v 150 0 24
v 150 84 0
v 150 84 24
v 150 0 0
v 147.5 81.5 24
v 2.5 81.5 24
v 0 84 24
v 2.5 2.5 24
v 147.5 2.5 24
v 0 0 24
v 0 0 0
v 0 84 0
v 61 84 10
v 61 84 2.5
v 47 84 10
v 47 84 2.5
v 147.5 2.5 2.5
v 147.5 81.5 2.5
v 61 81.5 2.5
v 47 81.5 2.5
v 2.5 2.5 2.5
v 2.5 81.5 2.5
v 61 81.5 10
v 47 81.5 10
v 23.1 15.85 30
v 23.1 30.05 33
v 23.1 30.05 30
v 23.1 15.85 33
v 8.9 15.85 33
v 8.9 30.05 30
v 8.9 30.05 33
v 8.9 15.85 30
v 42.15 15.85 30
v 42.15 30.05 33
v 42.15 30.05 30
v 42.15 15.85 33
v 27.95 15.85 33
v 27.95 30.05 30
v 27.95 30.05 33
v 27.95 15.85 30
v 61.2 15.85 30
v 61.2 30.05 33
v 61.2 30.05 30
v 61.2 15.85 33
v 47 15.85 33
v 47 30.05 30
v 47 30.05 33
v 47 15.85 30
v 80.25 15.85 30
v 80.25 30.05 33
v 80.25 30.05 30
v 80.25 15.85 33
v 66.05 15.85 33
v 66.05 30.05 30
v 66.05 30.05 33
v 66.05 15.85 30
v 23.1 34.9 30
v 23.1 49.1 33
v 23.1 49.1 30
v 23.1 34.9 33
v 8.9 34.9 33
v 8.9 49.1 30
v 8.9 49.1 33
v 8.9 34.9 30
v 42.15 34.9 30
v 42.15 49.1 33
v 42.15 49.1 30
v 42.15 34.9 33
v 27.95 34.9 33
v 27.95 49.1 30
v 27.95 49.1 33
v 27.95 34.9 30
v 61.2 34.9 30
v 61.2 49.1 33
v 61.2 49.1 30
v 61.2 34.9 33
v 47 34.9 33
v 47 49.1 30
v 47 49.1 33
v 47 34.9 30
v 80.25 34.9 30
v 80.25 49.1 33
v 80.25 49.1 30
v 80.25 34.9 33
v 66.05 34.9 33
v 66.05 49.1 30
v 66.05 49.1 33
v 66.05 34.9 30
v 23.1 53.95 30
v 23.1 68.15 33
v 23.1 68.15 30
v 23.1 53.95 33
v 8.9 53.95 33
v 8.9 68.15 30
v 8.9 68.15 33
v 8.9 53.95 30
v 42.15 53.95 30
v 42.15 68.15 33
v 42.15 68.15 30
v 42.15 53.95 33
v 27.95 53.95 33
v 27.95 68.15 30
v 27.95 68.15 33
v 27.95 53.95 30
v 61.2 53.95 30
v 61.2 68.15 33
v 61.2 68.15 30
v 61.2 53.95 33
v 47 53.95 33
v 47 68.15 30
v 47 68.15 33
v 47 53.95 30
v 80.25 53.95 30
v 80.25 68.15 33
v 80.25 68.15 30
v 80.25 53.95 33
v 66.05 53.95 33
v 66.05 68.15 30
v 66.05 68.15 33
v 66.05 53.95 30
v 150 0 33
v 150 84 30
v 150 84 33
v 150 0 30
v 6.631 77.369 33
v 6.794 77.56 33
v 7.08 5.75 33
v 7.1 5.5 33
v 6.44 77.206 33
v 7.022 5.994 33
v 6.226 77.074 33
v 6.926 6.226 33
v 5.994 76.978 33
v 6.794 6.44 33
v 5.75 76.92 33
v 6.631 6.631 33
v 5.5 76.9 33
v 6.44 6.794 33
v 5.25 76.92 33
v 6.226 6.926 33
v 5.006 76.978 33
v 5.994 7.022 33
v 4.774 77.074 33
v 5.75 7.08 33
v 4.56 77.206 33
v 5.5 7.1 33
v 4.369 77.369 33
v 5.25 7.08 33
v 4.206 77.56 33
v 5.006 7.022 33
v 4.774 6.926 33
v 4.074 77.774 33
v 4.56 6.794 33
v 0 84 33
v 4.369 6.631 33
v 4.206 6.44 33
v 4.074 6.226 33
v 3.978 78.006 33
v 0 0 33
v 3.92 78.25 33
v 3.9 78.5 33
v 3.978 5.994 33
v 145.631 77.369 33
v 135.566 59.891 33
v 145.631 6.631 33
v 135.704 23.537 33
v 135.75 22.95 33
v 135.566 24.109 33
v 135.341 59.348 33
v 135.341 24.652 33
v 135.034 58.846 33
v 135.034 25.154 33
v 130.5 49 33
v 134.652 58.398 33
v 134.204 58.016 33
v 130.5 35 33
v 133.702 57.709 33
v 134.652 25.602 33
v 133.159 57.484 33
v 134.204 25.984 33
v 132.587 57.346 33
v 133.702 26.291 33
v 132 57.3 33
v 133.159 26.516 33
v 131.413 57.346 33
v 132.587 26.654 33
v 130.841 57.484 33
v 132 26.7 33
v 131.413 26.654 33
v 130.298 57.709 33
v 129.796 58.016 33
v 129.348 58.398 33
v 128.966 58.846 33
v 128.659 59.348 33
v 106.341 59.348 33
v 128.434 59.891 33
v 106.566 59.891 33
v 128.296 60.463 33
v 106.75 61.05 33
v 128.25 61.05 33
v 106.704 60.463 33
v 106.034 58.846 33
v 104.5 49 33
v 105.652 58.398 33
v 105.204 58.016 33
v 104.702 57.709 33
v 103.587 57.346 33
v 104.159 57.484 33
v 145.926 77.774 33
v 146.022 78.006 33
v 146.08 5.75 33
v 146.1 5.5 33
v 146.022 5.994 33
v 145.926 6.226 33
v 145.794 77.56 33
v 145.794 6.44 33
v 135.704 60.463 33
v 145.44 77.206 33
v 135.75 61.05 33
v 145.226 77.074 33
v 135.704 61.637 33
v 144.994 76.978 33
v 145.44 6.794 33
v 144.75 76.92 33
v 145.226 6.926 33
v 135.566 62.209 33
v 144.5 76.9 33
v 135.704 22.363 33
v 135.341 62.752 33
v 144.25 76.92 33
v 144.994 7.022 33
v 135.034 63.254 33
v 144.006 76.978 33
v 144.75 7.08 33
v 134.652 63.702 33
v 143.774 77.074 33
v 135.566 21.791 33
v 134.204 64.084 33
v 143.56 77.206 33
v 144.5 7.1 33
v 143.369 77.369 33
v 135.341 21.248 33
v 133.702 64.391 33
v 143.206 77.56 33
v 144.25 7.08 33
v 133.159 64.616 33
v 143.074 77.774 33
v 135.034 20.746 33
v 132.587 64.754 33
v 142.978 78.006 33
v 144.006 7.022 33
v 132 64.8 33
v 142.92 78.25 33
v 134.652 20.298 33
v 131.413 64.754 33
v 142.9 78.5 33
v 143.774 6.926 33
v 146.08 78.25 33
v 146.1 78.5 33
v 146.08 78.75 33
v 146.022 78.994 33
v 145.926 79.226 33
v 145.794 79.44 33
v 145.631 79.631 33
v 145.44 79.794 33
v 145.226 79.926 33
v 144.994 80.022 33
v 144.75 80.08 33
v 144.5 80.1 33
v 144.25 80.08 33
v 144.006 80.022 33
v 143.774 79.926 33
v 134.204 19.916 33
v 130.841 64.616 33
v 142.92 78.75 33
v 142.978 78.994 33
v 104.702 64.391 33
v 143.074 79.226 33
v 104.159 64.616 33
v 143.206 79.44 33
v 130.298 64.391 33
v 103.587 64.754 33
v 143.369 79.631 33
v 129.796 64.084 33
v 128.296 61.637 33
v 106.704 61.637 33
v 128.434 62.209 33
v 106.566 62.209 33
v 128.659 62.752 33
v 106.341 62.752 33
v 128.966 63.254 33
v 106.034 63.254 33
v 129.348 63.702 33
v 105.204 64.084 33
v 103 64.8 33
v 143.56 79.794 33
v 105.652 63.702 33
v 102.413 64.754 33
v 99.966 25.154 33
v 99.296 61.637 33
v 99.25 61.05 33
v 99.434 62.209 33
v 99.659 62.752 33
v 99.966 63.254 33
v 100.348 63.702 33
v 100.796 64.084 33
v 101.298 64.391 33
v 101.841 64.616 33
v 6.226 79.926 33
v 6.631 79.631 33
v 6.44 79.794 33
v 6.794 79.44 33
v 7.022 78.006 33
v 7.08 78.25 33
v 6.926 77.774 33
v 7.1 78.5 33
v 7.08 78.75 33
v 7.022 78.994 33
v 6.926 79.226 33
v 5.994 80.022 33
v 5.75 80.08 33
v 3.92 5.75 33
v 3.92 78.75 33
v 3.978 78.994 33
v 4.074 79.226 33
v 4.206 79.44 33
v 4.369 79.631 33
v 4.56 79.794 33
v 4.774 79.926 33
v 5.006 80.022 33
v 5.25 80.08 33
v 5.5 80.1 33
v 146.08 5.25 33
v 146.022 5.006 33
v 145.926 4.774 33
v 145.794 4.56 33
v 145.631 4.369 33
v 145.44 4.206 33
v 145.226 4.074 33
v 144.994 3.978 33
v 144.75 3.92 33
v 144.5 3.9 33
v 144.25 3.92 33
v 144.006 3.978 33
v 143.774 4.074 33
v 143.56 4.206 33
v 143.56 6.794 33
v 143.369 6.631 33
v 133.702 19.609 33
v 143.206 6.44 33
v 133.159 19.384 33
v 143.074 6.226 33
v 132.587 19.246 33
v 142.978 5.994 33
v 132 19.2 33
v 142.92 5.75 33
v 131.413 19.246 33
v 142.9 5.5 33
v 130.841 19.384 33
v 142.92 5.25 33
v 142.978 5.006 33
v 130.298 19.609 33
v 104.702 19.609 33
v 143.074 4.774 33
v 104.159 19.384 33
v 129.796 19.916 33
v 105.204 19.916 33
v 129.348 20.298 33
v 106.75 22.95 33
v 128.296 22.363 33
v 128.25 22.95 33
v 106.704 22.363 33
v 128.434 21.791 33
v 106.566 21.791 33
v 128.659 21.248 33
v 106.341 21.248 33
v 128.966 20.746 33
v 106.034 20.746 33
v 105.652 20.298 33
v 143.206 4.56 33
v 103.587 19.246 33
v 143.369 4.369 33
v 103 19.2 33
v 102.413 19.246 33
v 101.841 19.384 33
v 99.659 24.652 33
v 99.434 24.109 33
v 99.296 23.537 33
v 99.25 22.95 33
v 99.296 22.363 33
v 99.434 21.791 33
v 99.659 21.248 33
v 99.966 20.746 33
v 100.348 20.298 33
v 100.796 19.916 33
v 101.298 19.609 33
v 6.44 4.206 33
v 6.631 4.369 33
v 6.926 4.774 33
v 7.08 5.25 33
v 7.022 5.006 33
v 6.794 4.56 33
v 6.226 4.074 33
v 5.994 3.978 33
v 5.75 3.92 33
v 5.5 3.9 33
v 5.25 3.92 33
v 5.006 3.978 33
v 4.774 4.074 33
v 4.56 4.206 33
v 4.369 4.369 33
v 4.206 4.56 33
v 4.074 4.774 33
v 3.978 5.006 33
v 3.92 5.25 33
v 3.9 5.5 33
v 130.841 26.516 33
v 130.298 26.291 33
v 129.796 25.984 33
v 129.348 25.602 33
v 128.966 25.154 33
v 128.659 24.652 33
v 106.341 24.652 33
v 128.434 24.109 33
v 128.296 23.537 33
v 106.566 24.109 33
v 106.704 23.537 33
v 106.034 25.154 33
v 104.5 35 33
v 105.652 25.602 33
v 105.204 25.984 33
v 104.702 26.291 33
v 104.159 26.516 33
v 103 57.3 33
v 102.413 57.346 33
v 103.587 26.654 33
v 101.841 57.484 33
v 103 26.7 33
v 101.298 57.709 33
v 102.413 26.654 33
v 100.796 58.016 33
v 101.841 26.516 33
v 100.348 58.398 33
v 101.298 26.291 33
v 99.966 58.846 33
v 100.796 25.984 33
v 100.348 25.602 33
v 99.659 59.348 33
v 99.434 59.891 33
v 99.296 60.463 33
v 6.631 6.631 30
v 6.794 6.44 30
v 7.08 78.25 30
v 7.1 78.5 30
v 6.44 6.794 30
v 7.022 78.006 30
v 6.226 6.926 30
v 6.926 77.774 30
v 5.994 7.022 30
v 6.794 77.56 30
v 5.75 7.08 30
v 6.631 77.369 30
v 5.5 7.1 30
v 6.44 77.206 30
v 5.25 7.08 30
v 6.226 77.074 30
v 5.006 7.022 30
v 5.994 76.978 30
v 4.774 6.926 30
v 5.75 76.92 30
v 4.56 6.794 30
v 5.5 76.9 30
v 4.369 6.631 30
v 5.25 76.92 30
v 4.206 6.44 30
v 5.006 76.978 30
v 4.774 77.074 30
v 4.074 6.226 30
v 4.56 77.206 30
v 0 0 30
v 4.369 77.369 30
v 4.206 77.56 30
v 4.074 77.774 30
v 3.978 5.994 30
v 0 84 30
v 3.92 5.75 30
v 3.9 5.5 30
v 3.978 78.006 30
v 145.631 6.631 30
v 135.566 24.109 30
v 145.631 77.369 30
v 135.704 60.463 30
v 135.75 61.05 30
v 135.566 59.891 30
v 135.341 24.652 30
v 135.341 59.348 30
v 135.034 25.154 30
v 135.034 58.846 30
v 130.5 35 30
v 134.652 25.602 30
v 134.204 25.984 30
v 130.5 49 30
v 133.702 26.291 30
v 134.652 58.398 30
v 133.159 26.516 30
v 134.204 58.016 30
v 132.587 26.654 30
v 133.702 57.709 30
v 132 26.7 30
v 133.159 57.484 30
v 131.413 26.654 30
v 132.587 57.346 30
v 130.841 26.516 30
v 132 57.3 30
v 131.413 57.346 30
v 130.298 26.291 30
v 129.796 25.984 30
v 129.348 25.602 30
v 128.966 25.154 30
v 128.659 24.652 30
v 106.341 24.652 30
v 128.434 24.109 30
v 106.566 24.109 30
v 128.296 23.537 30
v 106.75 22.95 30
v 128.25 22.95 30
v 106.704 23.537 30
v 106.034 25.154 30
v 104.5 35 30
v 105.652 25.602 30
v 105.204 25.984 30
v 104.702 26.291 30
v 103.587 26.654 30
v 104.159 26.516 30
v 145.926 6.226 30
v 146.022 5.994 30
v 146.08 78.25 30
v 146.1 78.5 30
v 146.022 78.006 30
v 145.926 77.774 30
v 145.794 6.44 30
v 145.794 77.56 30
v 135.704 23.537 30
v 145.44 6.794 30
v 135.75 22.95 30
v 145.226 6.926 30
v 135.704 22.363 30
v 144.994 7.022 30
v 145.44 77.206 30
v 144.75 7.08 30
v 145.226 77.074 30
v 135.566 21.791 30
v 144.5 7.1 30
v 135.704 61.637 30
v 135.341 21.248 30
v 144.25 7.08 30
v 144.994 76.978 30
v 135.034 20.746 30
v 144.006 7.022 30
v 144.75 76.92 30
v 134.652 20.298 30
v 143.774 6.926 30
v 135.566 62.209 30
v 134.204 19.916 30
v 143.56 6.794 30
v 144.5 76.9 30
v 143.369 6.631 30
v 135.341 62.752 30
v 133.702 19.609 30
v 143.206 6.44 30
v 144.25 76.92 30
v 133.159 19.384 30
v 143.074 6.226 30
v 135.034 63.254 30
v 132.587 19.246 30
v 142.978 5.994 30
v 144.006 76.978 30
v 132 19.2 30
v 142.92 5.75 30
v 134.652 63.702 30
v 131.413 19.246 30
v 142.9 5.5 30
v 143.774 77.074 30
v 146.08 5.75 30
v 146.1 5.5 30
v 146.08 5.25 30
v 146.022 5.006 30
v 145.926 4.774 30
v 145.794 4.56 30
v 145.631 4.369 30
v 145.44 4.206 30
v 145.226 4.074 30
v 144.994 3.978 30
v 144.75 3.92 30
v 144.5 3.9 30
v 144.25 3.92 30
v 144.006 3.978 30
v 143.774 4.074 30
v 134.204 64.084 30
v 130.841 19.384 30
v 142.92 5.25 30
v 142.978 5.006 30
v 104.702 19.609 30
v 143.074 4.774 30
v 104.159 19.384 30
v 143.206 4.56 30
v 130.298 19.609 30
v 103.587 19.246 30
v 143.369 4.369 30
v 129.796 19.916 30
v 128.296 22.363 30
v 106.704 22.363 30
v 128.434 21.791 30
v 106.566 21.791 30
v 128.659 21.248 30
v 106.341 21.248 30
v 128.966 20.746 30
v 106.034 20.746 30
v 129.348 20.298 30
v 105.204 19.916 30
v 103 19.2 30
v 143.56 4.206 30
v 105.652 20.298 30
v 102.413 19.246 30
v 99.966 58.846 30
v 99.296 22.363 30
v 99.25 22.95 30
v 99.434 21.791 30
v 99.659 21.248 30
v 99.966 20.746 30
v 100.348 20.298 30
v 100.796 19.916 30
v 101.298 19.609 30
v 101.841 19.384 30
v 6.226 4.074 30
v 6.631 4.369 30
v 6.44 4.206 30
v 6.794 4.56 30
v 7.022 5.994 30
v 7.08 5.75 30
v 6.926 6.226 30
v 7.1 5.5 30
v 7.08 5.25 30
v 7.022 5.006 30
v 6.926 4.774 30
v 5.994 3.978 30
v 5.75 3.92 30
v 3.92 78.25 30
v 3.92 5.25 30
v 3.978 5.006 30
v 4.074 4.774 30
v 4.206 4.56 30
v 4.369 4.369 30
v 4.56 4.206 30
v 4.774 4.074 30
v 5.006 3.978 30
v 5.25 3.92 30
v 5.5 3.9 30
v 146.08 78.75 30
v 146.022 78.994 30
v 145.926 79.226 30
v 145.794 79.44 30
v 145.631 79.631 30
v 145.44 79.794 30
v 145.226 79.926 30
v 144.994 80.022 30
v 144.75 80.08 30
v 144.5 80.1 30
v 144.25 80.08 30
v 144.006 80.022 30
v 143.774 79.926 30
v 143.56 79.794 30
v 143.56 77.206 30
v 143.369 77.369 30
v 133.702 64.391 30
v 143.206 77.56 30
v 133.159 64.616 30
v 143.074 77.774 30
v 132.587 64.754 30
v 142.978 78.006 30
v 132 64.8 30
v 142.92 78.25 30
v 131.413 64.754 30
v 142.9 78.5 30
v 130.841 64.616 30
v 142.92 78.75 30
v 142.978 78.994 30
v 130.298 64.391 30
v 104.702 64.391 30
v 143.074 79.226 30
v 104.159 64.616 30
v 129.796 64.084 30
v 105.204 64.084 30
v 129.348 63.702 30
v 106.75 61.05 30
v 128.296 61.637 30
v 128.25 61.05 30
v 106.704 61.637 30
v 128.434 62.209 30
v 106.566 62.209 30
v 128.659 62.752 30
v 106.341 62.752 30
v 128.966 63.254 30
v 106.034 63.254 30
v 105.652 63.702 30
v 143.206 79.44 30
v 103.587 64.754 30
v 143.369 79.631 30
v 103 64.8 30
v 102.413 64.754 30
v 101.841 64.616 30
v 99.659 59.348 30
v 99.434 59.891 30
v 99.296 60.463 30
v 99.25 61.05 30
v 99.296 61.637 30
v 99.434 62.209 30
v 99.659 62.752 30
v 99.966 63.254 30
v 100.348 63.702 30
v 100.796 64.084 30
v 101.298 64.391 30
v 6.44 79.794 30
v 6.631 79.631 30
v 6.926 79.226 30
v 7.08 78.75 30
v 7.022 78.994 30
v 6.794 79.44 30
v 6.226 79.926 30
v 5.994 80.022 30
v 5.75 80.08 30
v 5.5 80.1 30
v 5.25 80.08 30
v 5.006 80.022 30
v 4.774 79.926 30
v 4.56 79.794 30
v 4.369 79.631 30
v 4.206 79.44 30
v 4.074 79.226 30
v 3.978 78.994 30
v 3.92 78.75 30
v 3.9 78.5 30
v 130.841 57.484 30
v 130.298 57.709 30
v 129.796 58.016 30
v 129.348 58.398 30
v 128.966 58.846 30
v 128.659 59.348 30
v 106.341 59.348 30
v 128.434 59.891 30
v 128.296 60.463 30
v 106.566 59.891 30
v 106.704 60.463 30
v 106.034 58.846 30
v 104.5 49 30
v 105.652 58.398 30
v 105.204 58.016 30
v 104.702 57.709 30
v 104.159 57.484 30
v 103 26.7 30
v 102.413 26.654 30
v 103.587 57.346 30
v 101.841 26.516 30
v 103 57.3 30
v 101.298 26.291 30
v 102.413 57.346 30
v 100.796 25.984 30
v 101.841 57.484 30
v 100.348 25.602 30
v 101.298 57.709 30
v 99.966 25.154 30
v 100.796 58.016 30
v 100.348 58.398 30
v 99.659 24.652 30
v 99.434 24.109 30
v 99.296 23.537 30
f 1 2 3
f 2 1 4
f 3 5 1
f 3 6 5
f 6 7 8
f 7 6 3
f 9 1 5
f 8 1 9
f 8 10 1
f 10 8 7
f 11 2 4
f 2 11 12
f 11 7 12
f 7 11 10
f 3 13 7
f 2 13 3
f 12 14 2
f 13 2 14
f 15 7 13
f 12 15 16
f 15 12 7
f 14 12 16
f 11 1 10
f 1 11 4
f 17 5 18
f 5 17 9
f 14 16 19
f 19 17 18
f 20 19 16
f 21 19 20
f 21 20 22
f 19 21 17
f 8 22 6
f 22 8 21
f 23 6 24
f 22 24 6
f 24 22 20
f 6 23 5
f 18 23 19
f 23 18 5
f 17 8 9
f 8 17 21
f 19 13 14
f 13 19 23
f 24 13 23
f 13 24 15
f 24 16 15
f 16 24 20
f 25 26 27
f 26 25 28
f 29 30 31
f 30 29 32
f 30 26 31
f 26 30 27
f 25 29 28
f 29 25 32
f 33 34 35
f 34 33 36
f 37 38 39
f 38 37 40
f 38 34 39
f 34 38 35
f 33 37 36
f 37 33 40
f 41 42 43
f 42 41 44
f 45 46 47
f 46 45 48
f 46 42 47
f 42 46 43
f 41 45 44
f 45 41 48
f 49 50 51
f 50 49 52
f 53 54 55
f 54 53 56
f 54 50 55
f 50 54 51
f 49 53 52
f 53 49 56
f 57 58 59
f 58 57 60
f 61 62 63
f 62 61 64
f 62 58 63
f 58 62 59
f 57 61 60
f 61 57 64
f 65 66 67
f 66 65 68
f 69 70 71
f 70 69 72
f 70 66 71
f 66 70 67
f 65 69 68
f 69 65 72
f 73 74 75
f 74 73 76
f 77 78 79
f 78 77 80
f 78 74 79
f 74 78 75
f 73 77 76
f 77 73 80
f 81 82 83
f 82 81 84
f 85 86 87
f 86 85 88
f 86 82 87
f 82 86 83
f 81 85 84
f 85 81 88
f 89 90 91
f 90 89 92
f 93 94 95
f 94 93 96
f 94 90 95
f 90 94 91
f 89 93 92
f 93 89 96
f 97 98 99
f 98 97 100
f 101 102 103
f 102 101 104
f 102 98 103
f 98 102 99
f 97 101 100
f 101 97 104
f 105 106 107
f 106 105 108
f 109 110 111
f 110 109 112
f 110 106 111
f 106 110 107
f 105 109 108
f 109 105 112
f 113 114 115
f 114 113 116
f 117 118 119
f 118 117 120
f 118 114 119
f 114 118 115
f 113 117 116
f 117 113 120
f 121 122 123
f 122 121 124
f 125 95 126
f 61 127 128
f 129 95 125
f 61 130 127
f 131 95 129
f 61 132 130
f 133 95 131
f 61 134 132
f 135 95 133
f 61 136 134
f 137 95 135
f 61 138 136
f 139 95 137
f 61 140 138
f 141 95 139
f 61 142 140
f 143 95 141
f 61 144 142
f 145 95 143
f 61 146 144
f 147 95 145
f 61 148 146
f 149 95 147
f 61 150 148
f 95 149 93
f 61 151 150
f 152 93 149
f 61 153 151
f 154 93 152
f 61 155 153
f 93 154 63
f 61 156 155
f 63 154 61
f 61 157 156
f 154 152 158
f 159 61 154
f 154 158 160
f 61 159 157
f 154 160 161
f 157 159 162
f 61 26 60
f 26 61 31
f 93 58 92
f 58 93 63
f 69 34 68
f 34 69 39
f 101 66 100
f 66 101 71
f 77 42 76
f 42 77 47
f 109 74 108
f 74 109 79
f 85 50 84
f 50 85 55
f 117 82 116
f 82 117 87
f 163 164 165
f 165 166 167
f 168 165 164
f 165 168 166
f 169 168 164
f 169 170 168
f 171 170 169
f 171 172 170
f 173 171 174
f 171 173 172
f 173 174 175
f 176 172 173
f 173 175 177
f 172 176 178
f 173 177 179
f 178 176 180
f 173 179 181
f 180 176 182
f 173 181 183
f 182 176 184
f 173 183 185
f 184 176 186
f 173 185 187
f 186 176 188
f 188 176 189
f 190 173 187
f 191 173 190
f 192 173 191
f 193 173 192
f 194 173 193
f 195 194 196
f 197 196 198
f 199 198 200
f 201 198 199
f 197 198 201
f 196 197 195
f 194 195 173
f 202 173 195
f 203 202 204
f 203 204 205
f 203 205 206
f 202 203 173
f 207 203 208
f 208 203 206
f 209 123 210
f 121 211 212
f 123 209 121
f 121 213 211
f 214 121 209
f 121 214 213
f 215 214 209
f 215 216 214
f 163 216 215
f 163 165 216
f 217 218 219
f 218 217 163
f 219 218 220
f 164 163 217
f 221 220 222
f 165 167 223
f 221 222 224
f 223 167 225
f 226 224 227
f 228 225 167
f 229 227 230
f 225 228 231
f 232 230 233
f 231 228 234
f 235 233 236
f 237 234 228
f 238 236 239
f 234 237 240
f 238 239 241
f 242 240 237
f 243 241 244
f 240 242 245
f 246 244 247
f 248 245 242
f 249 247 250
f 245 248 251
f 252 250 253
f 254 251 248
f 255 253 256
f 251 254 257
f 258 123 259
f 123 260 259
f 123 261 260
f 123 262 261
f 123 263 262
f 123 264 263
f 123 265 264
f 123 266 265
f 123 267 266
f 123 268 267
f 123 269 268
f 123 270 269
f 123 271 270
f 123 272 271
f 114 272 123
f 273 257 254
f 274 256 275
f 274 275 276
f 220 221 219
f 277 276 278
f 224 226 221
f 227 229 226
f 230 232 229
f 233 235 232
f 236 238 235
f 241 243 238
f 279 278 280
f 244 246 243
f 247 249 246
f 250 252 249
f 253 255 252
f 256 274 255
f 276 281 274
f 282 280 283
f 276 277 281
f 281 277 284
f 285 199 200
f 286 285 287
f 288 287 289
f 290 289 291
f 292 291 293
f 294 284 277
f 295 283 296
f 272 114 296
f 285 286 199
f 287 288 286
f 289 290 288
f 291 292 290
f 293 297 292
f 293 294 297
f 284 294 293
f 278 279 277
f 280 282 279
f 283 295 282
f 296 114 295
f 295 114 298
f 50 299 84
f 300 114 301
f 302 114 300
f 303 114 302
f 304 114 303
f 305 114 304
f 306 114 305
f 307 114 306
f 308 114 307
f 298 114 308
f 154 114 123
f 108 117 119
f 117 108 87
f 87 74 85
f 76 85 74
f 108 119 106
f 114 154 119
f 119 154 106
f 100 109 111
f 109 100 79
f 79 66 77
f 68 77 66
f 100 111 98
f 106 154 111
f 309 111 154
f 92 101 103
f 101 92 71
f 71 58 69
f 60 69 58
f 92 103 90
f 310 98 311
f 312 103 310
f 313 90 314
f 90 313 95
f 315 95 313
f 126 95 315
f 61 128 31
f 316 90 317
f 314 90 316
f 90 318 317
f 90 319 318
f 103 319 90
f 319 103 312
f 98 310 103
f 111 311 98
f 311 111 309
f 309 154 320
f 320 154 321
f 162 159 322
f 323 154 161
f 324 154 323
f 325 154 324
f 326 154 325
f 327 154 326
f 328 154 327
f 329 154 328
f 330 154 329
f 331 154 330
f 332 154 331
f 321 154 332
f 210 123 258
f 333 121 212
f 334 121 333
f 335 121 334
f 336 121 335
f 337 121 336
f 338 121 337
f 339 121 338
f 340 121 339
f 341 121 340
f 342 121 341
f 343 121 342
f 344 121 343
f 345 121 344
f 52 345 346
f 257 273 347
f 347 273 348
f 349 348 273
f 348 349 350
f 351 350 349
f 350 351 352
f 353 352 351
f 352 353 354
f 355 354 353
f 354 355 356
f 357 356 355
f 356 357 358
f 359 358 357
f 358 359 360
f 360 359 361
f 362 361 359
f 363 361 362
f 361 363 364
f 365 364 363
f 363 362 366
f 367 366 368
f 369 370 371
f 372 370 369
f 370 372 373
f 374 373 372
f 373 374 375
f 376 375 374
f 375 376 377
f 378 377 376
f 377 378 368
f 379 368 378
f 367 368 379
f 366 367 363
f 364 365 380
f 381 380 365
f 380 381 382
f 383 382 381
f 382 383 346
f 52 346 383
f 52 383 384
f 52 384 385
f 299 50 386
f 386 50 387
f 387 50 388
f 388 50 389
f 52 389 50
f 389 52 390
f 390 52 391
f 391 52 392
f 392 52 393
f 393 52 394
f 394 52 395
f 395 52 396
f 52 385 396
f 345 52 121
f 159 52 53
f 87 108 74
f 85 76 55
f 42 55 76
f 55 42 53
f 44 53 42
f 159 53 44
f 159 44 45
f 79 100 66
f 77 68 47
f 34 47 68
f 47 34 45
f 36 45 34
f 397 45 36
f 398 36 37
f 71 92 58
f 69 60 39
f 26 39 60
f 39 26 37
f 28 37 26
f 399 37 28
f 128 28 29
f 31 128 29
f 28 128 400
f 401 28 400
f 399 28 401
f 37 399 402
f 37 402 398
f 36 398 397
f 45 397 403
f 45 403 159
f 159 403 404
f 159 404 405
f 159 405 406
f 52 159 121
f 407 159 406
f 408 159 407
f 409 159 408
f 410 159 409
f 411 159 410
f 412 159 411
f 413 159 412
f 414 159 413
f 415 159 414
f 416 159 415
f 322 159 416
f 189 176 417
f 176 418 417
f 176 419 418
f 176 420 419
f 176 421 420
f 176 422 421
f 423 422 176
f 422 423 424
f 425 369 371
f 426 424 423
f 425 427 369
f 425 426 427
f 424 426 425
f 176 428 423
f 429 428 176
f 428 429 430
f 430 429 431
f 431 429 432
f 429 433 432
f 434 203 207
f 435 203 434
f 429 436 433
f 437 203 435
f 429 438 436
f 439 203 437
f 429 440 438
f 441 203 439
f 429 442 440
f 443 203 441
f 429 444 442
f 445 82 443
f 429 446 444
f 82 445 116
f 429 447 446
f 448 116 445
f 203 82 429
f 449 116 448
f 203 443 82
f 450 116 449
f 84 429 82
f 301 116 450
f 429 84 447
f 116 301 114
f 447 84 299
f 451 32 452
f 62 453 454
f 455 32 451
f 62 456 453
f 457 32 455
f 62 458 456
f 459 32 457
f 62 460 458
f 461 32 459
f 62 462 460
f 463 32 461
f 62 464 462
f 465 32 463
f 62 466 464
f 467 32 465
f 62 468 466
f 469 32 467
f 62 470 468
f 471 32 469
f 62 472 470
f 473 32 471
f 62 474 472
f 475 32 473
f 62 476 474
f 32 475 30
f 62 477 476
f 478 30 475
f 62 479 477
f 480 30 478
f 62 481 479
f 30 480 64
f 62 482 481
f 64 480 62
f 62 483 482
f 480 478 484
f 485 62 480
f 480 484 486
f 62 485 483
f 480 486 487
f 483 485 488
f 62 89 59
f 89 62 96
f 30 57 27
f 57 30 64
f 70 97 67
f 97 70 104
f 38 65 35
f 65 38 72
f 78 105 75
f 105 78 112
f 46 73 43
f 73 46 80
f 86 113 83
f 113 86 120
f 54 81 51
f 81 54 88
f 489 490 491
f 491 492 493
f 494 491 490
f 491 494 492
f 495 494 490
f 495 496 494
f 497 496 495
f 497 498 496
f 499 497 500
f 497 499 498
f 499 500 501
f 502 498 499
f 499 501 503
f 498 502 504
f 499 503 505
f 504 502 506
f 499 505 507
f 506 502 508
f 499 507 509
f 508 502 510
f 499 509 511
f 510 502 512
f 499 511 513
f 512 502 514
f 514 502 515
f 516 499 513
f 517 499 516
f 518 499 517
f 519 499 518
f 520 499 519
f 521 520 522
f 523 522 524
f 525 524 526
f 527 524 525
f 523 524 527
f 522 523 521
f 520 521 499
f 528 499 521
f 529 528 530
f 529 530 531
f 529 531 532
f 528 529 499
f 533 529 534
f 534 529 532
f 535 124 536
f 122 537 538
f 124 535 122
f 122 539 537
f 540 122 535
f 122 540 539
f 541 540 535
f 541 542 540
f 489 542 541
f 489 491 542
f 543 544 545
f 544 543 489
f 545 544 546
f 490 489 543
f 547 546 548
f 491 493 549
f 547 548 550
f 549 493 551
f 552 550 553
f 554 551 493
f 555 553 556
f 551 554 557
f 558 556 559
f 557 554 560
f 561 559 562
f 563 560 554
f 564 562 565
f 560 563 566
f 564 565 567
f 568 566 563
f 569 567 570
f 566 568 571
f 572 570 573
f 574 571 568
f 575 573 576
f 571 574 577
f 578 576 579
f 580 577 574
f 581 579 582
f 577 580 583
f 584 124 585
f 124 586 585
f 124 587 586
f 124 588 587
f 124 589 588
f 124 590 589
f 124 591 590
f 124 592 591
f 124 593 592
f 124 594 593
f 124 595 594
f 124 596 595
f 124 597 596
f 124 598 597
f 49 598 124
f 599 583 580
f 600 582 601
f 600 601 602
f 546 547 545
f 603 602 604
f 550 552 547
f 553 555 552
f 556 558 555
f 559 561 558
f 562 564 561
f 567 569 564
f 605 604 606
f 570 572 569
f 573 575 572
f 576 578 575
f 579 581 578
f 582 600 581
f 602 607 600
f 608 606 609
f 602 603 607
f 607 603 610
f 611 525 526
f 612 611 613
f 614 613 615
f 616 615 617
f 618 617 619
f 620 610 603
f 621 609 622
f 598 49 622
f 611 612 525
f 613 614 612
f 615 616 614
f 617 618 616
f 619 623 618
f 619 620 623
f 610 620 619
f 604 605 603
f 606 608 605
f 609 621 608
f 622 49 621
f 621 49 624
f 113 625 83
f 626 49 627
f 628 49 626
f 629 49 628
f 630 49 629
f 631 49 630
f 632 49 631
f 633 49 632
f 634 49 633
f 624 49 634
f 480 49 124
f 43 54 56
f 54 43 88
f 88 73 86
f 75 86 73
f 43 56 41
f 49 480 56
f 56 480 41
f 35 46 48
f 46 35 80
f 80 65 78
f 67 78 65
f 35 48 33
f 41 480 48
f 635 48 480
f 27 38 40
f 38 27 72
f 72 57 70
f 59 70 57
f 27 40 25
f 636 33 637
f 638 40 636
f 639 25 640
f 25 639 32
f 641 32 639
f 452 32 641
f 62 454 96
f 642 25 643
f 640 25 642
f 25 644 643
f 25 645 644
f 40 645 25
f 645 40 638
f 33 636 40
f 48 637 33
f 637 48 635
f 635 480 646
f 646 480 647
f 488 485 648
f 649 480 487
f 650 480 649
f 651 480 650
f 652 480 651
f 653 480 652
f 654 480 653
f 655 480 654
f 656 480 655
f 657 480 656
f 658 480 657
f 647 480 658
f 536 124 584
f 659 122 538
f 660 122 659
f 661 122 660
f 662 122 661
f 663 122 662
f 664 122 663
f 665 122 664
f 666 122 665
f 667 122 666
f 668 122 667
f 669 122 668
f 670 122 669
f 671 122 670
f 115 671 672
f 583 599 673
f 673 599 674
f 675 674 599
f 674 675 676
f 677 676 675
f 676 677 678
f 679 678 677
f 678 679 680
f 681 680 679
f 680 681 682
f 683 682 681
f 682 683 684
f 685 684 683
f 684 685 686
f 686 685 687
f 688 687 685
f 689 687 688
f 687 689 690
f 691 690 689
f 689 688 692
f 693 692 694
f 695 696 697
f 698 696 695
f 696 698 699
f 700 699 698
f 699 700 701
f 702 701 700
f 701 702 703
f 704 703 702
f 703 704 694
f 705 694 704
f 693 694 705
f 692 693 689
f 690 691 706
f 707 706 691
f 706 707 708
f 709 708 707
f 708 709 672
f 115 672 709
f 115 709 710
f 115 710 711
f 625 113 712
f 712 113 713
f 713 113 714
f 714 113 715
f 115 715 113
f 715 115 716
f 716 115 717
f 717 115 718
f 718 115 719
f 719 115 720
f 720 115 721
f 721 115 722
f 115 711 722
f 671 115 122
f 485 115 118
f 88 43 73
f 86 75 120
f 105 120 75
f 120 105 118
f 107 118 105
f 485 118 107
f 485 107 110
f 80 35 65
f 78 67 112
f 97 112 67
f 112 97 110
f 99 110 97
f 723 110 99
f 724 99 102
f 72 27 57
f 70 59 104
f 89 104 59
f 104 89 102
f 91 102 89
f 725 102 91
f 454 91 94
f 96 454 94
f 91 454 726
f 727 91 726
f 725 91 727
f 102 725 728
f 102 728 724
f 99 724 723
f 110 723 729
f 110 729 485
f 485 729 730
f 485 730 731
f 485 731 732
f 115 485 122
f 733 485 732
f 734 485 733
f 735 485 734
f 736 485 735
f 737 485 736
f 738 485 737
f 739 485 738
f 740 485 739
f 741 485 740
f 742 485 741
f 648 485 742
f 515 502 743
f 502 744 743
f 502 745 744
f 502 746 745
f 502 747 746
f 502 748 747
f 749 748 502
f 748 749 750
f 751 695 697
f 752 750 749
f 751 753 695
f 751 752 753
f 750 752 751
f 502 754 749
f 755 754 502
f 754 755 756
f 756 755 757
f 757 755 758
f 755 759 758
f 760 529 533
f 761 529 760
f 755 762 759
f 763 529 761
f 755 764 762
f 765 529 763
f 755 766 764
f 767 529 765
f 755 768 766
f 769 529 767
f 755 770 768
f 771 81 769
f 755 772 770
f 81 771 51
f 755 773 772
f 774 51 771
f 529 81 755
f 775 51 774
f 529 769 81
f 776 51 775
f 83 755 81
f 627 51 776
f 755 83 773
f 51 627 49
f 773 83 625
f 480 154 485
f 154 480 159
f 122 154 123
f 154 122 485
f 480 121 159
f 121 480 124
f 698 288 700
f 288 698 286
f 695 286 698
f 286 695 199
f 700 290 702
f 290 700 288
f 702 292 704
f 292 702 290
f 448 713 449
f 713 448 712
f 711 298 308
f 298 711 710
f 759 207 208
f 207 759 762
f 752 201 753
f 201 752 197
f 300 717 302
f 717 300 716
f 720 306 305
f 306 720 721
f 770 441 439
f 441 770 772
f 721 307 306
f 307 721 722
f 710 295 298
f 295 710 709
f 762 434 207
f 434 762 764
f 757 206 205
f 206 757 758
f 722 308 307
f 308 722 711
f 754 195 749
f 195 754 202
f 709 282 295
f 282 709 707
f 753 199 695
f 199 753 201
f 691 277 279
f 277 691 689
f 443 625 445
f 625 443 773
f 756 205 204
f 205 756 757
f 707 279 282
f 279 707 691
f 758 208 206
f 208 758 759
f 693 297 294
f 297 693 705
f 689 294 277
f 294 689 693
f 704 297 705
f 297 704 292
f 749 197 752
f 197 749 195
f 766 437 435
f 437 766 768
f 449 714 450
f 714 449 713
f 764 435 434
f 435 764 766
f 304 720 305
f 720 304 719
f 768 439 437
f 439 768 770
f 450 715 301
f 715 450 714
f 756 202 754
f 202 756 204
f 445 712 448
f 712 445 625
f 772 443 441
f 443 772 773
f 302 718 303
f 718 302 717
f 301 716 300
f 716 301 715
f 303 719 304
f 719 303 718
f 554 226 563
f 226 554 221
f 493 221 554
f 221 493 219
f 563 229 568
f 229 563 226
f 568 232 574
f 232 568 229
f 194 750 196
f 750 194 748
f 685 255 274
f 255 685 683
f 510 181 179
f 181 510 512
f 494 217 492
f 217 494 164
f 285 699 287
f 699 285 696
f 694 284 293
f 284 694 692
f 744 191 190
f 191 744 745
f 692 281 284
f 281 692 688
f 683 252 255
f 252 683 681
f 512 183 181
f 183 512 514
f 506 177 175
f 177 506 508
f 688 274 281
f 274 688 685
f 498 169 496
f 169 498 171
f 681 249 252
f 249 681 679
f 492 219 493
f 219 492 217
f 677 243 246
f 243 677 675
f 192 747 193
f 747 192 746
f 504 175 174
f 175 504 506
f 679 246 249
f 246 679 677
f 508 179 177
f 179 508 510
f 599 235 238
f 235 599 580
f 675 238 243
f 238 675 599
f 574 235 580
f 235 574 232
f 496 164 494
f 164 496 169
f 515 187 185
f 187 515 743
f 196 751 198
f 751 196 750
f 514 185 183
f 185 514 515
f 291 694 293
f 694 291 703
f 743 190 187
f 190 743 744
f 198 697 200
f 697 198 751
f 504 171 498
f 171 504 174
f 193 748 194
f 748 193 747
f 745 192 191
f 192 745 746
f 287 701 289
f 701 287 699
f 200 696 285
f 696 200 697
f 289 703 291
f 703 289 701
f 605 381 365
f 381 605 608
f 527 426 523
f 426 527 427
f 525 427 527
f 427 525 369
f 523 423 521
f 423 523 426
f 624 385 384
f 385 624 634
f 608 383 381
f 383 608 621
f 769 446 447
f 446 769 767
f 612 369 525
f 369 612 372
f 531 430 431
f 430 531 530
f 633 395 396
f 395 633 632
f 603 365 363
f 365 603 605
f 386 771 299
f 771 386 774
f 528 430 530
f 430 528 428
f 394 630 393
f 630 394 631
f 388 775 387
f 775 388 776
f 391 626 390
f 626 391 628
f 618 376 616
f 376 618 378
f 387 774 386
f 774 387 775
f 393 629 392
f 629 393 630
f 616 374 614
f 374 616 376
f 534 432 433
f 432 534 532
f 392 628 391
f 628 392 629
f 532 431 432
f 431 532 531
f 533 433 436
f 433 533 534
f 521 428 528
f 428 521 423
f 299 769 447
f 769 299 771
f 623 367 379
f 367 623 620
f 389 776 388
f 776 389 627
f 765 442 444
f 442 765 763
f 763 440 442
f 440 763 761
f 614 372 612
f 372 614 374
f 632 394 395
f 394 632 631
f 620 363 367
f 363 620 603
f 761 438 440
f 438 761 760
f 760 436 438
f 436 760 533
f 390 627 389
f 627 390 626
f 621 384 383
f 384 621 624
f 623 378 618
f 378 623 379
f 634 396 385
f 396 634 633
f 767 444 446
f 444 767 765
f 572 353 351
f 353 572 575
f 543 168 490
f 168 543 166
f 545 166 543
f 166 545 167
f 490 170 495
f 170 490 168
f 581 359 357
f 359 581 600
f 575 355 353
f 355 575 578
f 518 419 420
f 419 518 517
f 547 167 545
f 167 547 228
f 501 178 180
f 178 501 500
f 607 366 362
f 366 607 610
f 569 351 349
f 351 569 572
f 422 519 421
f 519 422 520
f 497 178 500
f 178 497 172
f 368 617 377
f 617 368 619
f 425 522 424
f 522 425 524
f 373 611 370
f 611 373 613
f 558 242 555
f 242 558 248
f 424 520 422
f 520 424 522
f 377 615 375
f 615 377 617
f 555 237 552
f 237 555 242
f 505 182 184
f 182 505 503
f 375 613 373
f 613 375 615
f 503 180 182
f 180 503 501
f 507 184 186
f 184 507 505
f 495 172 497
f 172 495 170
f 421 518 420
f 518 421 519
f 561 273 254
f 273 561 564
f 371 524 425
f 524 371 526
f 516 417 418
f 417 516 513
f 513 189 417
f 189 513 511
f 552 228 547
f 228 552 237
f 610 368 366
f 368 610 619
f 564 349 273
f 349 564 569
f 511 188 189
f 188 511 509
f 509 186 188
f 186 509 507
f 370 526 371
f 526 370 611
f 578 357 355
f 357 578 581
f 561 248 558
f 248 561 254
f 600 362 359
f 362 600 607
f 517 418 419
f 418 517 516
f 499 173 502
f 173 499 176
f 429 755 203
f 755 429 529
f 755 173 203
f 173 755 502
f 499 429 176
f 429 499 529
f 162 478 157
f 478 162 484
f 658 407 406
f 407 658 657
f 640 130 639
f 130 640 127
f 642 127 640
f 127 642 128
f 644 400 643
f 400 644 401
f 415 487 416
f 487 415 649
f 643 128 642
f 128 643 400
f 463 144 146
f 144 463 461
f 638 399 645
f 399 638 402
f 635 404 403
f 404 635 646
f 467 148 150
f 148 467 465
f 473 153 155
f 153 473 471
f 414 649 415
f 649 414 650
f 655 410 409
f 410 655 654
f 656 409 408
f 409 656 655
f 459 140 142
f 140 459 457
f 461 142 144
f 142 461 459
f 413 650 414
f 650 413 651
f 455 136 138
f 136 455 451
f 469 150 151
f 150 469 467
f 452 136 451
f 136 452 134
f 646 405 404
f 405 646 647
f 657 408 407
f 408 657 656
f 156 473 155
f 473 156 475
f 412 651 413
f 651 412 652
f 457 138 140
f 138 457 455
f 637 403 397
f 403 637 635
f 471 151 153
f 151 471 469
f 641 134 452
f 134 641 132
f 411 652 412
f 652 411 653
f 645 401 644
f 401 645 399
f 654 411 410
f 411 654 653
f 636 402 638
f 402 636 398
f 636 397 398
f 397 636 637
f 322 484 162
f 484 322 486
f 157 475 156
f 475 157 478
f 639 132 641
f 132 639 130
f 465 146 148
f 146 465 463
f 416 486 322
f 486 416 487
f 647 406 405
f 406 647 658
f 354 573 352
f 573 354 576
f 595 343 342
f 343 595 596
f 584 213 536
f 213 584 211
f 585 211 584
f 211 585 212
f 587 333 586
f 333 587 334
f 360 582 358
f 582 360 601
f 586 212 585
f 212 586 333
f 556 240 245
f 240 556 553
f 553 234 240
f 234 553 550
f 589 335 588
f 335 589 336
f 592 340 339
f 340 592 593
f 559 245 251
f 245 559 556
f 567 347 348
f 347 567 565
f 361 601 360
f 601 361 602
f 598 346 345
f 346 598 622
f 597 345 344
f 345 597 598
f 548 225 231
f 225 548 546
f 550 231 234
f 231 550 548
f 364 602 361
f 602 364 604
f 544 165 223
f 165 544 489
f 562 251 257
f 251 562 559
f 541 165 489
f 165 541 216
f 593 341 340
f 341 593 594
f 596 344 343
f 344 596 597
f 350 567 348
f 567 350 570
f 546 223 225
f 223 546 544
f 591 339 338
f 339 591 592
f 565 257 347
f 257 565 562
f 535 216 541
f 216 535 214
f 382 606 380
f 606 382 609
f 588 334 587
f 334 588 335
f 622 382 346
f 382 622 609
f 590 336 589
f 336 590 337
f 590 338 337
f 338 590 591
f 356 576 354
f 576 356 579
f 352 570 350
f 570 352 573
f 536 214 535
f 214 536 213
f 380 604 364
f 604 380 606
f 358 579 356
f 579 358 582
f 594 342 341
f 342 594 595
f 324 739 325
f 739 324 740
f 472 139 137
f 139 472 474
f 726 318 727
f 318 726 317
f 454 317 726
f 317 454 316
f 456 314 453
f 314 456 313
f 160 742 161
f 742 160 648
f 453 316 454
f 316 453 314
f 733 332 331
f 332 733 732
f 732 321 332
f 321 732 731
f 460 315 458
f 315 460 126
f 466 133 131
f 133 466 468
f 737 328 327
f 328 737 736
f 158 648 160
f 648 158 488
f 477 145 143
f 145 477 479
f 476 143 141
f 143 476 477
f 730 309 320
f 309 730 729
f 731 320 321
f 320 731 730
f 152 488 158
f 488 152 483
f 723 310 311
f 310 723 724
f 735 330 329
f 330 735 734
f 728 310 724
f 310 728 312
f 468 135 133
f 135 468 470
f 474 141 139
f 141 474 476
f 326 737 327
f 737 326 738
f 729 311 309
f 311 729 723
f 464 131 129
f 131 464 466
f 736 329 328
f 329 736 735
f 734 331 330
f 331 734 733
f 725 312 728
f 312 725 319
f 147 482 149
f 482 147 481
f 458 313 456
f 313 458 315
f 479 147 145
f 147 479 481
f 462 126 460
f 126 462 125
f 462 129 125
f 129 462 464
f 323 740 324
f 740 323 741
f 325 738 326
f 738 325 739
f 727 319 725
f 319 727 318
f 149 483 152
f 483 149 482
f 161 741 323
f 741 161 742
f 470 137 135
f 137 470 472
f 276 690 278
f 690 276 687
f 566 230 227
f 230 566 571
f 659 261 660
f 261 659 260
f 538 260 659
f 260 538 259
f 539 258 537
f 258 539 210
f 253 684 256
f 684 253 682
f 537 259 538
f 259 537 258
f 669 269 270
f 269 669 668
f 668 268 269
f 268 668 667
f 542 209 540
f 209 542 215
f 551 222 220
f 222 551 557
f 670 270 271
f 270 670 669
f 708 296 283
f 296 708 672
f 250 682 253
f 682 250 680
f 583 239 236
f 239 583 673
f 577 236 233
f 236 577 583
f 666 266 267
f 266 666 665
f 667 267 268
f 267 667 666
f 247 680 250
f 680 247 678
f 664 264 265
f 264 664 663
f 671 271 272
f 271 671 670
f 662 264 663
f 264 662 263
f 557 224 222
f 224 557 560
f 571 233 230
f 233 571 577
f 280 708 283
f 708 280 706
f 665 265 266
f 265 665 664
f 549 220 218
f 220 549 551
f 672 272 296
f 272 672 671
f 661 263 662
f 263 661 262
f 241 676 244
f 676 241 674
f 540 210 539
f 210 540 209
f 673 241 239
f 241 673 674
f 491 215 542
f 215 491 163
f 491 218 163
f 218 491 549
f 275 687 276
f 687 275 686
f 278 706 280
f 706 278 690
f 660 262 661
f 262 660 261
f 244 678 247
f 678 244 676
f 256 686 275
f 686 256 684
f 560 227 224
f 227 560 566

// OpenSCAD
// ===================================================================
// ESP32 Wireless Stream Deck & Audio Mixer - Parametric Enclosure
// OpenSCAD Model
// ===================================================================

// Hvad vil du vise? ("both", "top", "bottom")
part = "both"; // ["both", "top", "bottom"]

// --- Hoveddimensioner ---
case_width       = 150.0;
case_depth       = 84.0;
case_height      = 24.0;
wall_thickness   = 2.5;
floor_thickness  = 2.5;
plate_thickness  = 3.0;

// --- MX Taster (4 kolonner x 3 rækker) ---
switch_hole_size = 14.2;   // 14.0 mm nominel, 14.2 mm giver ideelt snap-fit i 3D print
switch_pitch_x   = 19.05;  // Standard 1U tastatur pitch
switch_pitch_y   = 19.05;
keys_origin_x    = 16.0;   // Første kolonne center
keys_origin_y    = 22.95;  // Første række center

// --- Potentiometre (4 stk) ---
pot_hole_d       = 7.5;    // M7 gevind med frigang
pot_x1           = 103.0;
pot_x2           = 132.0;
pot_y_top        = 61.05;  // På linje med øverste tasterække
pot_y_bottom     = 22.95;  // På linje med nederste tasterække

// --- 0.96" OLED Display (SSD1306) ---
oled_center_x    = 117.5;
oled_center_y    = 42.0;   // På linje med midterste tasterække
oled_window_w    = 26.0;
oled_window_h    = 14.0;

// --- Montage & Skruer ---
screw_hole_d     = 3.2;    // M3 gennemgående hul
tower_size       = 9.5;
tower_screw_d    = 2.8;    // M3 pilot hul i tårne
corner_inset     = 5.5;

// --- USB Port ---
usb_w            = 14.0;
usb_h            = 7.5;
usb_x            = 54.0;   // Centreret i forhold til ESP32

$fn = 40;

// ===================================================================
// MODULER
// ===================================================================

module top_plate() {
    difference() {
        // Hovedplade
        cube([case_width, case_depth, plate_thickness]);

        // 12x MX Switch huller
        for (r = [0 : 2]) {
            for (c = [0 : 3]) {
                translate([
                    keys_origin_x + c * switch_pitch_x - switch_hole_size / 2,
                    keys_origin_y + r * switch_pitch_y - switch_hole_size / 2,
                    -1
                ])
                cube([switch_hole_size, switch_hole_size, plate_thickness + 2]);
            }
        }

        // 4x Potentiometer huller
        translate([pot_x1, pot_y_top, -1])    cylinder(d = pot_hole_d, h = plate_thickness + 2);
        translate([pot_x2, pot_y_top, -1])    cylinder(d = pot_hole_d, h = plate_thickness + 2);
        translate([pot_x1, pot_y_bottom, -1]) cylinder(d = pot_hole_d, h = plate_thickness + 2);
        translate([pot_x2, pot_y_bottom, -1]) cylinder(d = pot_hole_d, h = plate_thickness + 2);

        // OLED skærm vindue
        translate([
            oled_center_x - oled_window_w / 2,
            oled_center_y - oled_window_h / 2,
            -1
        ])
        cube([oled_window_w, oled_window_h, plate_thickness + 2]);

        // 4x Hjørneskruehuller
        translate([corner_inset, corner_inset, -1]) cylinder(d = screw_hole_d, h = plate_thickness + 2);
        translate([case_width - corner_inset, corner_inset, -1]) cylinder(d = screw_hole_d, h = plate_thickness + 2);
        translate([corner_inset, case_depth - corner_inset, -1]) cylinder(d = screw_hole_d, h = plate_thickness + 2);
        translate([case_width - corner_inset, case_depth - corner_inset, -1]) cylinder(d = screw_hole_d, h = plate_thickness + 2);
    }
}

module bottom_case() {
    difference() {
        union() {
            // Yderboks
            cube([case_width, case_depth, case_height]);

            // 4 indvendige hjørnetårne
            translate([wall_thickness, wall_thickness, floor_thickness])
                cube([tower_size, tower_size, case_height - floor_thickness]);
            translate([case_width - wall_thickness - tower_size, wall_thickness, floor_thickness])
                cube([tower_size, tower_size, case_height - floor_thickness]);
            translate([wall_thickness, case_depth - wall_thickness - tower_size, floor_thickness])
                cube([tower_size, tower_size, case_height - floor_thickness]);
            translate([case_width - wall_thickness - tower_size, case_depth - wall_thickness - tower_size, floor_thickness])
                cube([tower_size, tower_size, case_height - floor_thickness]);

            // ESP32 skinner / standoffs på bunden
            translate([usb_x - 14.0, 25.0, floor_thickness])
                cube([3.0, 48.0, 3.0]);
            translate([usb_x + 11.0, 25.0, floor_thickness])
                cube([3.0, 48.0, 3.0]);
        }

        // Hovedhulrum
        translate([wall_thickness, wall_thickness, floor_thickness])
            cube([
                case_width - 2 * wall_thickness,
                case_depth - 2 * wall_thickness,
                case_height + 1
            ]);

        // 4x Skruehuller i hjørnetårne
        translate([corner_inset, corner_inset, floor_thickness])
            cylinder(d = tower_screw_d, h = case_height);
        translate([case_width - corner_inset, corner_inset, floor_thickness])
            cylinder(d = tower_screw_d, h = case_height);
        translate([corner_inset, case_depth - corner_inset, floor_thickness])
            cylinder(d = tower_screw_d, h = case_height);
        translate([case_width - corner_inset, case_depth - corner_inset, floor_thickness])
            cylinder(d = tower_screw_d, h = case_height);

        // USB-port åbning på bagvæggen
        translate([usb_x - usb_w / 2, case_depth - wall_thickness - 1, floor_thickness])
            cube([usb_w, wall_thickness + 2, usb_h]);
    }
}

// ===================================================================
// RENDER VALG
// ===================================================================

if (part == "both") {
    // Viser kassen samlet (top svævende lidt over bunden)
    color("DimGray") bottom_case();
    color("SteelBlue") translate([0, 0, case_height + 6]) top_plate();
} else if (part == "top") {
    top_plate();
} else if (part == "bottom") {
    bottom_case();
}
